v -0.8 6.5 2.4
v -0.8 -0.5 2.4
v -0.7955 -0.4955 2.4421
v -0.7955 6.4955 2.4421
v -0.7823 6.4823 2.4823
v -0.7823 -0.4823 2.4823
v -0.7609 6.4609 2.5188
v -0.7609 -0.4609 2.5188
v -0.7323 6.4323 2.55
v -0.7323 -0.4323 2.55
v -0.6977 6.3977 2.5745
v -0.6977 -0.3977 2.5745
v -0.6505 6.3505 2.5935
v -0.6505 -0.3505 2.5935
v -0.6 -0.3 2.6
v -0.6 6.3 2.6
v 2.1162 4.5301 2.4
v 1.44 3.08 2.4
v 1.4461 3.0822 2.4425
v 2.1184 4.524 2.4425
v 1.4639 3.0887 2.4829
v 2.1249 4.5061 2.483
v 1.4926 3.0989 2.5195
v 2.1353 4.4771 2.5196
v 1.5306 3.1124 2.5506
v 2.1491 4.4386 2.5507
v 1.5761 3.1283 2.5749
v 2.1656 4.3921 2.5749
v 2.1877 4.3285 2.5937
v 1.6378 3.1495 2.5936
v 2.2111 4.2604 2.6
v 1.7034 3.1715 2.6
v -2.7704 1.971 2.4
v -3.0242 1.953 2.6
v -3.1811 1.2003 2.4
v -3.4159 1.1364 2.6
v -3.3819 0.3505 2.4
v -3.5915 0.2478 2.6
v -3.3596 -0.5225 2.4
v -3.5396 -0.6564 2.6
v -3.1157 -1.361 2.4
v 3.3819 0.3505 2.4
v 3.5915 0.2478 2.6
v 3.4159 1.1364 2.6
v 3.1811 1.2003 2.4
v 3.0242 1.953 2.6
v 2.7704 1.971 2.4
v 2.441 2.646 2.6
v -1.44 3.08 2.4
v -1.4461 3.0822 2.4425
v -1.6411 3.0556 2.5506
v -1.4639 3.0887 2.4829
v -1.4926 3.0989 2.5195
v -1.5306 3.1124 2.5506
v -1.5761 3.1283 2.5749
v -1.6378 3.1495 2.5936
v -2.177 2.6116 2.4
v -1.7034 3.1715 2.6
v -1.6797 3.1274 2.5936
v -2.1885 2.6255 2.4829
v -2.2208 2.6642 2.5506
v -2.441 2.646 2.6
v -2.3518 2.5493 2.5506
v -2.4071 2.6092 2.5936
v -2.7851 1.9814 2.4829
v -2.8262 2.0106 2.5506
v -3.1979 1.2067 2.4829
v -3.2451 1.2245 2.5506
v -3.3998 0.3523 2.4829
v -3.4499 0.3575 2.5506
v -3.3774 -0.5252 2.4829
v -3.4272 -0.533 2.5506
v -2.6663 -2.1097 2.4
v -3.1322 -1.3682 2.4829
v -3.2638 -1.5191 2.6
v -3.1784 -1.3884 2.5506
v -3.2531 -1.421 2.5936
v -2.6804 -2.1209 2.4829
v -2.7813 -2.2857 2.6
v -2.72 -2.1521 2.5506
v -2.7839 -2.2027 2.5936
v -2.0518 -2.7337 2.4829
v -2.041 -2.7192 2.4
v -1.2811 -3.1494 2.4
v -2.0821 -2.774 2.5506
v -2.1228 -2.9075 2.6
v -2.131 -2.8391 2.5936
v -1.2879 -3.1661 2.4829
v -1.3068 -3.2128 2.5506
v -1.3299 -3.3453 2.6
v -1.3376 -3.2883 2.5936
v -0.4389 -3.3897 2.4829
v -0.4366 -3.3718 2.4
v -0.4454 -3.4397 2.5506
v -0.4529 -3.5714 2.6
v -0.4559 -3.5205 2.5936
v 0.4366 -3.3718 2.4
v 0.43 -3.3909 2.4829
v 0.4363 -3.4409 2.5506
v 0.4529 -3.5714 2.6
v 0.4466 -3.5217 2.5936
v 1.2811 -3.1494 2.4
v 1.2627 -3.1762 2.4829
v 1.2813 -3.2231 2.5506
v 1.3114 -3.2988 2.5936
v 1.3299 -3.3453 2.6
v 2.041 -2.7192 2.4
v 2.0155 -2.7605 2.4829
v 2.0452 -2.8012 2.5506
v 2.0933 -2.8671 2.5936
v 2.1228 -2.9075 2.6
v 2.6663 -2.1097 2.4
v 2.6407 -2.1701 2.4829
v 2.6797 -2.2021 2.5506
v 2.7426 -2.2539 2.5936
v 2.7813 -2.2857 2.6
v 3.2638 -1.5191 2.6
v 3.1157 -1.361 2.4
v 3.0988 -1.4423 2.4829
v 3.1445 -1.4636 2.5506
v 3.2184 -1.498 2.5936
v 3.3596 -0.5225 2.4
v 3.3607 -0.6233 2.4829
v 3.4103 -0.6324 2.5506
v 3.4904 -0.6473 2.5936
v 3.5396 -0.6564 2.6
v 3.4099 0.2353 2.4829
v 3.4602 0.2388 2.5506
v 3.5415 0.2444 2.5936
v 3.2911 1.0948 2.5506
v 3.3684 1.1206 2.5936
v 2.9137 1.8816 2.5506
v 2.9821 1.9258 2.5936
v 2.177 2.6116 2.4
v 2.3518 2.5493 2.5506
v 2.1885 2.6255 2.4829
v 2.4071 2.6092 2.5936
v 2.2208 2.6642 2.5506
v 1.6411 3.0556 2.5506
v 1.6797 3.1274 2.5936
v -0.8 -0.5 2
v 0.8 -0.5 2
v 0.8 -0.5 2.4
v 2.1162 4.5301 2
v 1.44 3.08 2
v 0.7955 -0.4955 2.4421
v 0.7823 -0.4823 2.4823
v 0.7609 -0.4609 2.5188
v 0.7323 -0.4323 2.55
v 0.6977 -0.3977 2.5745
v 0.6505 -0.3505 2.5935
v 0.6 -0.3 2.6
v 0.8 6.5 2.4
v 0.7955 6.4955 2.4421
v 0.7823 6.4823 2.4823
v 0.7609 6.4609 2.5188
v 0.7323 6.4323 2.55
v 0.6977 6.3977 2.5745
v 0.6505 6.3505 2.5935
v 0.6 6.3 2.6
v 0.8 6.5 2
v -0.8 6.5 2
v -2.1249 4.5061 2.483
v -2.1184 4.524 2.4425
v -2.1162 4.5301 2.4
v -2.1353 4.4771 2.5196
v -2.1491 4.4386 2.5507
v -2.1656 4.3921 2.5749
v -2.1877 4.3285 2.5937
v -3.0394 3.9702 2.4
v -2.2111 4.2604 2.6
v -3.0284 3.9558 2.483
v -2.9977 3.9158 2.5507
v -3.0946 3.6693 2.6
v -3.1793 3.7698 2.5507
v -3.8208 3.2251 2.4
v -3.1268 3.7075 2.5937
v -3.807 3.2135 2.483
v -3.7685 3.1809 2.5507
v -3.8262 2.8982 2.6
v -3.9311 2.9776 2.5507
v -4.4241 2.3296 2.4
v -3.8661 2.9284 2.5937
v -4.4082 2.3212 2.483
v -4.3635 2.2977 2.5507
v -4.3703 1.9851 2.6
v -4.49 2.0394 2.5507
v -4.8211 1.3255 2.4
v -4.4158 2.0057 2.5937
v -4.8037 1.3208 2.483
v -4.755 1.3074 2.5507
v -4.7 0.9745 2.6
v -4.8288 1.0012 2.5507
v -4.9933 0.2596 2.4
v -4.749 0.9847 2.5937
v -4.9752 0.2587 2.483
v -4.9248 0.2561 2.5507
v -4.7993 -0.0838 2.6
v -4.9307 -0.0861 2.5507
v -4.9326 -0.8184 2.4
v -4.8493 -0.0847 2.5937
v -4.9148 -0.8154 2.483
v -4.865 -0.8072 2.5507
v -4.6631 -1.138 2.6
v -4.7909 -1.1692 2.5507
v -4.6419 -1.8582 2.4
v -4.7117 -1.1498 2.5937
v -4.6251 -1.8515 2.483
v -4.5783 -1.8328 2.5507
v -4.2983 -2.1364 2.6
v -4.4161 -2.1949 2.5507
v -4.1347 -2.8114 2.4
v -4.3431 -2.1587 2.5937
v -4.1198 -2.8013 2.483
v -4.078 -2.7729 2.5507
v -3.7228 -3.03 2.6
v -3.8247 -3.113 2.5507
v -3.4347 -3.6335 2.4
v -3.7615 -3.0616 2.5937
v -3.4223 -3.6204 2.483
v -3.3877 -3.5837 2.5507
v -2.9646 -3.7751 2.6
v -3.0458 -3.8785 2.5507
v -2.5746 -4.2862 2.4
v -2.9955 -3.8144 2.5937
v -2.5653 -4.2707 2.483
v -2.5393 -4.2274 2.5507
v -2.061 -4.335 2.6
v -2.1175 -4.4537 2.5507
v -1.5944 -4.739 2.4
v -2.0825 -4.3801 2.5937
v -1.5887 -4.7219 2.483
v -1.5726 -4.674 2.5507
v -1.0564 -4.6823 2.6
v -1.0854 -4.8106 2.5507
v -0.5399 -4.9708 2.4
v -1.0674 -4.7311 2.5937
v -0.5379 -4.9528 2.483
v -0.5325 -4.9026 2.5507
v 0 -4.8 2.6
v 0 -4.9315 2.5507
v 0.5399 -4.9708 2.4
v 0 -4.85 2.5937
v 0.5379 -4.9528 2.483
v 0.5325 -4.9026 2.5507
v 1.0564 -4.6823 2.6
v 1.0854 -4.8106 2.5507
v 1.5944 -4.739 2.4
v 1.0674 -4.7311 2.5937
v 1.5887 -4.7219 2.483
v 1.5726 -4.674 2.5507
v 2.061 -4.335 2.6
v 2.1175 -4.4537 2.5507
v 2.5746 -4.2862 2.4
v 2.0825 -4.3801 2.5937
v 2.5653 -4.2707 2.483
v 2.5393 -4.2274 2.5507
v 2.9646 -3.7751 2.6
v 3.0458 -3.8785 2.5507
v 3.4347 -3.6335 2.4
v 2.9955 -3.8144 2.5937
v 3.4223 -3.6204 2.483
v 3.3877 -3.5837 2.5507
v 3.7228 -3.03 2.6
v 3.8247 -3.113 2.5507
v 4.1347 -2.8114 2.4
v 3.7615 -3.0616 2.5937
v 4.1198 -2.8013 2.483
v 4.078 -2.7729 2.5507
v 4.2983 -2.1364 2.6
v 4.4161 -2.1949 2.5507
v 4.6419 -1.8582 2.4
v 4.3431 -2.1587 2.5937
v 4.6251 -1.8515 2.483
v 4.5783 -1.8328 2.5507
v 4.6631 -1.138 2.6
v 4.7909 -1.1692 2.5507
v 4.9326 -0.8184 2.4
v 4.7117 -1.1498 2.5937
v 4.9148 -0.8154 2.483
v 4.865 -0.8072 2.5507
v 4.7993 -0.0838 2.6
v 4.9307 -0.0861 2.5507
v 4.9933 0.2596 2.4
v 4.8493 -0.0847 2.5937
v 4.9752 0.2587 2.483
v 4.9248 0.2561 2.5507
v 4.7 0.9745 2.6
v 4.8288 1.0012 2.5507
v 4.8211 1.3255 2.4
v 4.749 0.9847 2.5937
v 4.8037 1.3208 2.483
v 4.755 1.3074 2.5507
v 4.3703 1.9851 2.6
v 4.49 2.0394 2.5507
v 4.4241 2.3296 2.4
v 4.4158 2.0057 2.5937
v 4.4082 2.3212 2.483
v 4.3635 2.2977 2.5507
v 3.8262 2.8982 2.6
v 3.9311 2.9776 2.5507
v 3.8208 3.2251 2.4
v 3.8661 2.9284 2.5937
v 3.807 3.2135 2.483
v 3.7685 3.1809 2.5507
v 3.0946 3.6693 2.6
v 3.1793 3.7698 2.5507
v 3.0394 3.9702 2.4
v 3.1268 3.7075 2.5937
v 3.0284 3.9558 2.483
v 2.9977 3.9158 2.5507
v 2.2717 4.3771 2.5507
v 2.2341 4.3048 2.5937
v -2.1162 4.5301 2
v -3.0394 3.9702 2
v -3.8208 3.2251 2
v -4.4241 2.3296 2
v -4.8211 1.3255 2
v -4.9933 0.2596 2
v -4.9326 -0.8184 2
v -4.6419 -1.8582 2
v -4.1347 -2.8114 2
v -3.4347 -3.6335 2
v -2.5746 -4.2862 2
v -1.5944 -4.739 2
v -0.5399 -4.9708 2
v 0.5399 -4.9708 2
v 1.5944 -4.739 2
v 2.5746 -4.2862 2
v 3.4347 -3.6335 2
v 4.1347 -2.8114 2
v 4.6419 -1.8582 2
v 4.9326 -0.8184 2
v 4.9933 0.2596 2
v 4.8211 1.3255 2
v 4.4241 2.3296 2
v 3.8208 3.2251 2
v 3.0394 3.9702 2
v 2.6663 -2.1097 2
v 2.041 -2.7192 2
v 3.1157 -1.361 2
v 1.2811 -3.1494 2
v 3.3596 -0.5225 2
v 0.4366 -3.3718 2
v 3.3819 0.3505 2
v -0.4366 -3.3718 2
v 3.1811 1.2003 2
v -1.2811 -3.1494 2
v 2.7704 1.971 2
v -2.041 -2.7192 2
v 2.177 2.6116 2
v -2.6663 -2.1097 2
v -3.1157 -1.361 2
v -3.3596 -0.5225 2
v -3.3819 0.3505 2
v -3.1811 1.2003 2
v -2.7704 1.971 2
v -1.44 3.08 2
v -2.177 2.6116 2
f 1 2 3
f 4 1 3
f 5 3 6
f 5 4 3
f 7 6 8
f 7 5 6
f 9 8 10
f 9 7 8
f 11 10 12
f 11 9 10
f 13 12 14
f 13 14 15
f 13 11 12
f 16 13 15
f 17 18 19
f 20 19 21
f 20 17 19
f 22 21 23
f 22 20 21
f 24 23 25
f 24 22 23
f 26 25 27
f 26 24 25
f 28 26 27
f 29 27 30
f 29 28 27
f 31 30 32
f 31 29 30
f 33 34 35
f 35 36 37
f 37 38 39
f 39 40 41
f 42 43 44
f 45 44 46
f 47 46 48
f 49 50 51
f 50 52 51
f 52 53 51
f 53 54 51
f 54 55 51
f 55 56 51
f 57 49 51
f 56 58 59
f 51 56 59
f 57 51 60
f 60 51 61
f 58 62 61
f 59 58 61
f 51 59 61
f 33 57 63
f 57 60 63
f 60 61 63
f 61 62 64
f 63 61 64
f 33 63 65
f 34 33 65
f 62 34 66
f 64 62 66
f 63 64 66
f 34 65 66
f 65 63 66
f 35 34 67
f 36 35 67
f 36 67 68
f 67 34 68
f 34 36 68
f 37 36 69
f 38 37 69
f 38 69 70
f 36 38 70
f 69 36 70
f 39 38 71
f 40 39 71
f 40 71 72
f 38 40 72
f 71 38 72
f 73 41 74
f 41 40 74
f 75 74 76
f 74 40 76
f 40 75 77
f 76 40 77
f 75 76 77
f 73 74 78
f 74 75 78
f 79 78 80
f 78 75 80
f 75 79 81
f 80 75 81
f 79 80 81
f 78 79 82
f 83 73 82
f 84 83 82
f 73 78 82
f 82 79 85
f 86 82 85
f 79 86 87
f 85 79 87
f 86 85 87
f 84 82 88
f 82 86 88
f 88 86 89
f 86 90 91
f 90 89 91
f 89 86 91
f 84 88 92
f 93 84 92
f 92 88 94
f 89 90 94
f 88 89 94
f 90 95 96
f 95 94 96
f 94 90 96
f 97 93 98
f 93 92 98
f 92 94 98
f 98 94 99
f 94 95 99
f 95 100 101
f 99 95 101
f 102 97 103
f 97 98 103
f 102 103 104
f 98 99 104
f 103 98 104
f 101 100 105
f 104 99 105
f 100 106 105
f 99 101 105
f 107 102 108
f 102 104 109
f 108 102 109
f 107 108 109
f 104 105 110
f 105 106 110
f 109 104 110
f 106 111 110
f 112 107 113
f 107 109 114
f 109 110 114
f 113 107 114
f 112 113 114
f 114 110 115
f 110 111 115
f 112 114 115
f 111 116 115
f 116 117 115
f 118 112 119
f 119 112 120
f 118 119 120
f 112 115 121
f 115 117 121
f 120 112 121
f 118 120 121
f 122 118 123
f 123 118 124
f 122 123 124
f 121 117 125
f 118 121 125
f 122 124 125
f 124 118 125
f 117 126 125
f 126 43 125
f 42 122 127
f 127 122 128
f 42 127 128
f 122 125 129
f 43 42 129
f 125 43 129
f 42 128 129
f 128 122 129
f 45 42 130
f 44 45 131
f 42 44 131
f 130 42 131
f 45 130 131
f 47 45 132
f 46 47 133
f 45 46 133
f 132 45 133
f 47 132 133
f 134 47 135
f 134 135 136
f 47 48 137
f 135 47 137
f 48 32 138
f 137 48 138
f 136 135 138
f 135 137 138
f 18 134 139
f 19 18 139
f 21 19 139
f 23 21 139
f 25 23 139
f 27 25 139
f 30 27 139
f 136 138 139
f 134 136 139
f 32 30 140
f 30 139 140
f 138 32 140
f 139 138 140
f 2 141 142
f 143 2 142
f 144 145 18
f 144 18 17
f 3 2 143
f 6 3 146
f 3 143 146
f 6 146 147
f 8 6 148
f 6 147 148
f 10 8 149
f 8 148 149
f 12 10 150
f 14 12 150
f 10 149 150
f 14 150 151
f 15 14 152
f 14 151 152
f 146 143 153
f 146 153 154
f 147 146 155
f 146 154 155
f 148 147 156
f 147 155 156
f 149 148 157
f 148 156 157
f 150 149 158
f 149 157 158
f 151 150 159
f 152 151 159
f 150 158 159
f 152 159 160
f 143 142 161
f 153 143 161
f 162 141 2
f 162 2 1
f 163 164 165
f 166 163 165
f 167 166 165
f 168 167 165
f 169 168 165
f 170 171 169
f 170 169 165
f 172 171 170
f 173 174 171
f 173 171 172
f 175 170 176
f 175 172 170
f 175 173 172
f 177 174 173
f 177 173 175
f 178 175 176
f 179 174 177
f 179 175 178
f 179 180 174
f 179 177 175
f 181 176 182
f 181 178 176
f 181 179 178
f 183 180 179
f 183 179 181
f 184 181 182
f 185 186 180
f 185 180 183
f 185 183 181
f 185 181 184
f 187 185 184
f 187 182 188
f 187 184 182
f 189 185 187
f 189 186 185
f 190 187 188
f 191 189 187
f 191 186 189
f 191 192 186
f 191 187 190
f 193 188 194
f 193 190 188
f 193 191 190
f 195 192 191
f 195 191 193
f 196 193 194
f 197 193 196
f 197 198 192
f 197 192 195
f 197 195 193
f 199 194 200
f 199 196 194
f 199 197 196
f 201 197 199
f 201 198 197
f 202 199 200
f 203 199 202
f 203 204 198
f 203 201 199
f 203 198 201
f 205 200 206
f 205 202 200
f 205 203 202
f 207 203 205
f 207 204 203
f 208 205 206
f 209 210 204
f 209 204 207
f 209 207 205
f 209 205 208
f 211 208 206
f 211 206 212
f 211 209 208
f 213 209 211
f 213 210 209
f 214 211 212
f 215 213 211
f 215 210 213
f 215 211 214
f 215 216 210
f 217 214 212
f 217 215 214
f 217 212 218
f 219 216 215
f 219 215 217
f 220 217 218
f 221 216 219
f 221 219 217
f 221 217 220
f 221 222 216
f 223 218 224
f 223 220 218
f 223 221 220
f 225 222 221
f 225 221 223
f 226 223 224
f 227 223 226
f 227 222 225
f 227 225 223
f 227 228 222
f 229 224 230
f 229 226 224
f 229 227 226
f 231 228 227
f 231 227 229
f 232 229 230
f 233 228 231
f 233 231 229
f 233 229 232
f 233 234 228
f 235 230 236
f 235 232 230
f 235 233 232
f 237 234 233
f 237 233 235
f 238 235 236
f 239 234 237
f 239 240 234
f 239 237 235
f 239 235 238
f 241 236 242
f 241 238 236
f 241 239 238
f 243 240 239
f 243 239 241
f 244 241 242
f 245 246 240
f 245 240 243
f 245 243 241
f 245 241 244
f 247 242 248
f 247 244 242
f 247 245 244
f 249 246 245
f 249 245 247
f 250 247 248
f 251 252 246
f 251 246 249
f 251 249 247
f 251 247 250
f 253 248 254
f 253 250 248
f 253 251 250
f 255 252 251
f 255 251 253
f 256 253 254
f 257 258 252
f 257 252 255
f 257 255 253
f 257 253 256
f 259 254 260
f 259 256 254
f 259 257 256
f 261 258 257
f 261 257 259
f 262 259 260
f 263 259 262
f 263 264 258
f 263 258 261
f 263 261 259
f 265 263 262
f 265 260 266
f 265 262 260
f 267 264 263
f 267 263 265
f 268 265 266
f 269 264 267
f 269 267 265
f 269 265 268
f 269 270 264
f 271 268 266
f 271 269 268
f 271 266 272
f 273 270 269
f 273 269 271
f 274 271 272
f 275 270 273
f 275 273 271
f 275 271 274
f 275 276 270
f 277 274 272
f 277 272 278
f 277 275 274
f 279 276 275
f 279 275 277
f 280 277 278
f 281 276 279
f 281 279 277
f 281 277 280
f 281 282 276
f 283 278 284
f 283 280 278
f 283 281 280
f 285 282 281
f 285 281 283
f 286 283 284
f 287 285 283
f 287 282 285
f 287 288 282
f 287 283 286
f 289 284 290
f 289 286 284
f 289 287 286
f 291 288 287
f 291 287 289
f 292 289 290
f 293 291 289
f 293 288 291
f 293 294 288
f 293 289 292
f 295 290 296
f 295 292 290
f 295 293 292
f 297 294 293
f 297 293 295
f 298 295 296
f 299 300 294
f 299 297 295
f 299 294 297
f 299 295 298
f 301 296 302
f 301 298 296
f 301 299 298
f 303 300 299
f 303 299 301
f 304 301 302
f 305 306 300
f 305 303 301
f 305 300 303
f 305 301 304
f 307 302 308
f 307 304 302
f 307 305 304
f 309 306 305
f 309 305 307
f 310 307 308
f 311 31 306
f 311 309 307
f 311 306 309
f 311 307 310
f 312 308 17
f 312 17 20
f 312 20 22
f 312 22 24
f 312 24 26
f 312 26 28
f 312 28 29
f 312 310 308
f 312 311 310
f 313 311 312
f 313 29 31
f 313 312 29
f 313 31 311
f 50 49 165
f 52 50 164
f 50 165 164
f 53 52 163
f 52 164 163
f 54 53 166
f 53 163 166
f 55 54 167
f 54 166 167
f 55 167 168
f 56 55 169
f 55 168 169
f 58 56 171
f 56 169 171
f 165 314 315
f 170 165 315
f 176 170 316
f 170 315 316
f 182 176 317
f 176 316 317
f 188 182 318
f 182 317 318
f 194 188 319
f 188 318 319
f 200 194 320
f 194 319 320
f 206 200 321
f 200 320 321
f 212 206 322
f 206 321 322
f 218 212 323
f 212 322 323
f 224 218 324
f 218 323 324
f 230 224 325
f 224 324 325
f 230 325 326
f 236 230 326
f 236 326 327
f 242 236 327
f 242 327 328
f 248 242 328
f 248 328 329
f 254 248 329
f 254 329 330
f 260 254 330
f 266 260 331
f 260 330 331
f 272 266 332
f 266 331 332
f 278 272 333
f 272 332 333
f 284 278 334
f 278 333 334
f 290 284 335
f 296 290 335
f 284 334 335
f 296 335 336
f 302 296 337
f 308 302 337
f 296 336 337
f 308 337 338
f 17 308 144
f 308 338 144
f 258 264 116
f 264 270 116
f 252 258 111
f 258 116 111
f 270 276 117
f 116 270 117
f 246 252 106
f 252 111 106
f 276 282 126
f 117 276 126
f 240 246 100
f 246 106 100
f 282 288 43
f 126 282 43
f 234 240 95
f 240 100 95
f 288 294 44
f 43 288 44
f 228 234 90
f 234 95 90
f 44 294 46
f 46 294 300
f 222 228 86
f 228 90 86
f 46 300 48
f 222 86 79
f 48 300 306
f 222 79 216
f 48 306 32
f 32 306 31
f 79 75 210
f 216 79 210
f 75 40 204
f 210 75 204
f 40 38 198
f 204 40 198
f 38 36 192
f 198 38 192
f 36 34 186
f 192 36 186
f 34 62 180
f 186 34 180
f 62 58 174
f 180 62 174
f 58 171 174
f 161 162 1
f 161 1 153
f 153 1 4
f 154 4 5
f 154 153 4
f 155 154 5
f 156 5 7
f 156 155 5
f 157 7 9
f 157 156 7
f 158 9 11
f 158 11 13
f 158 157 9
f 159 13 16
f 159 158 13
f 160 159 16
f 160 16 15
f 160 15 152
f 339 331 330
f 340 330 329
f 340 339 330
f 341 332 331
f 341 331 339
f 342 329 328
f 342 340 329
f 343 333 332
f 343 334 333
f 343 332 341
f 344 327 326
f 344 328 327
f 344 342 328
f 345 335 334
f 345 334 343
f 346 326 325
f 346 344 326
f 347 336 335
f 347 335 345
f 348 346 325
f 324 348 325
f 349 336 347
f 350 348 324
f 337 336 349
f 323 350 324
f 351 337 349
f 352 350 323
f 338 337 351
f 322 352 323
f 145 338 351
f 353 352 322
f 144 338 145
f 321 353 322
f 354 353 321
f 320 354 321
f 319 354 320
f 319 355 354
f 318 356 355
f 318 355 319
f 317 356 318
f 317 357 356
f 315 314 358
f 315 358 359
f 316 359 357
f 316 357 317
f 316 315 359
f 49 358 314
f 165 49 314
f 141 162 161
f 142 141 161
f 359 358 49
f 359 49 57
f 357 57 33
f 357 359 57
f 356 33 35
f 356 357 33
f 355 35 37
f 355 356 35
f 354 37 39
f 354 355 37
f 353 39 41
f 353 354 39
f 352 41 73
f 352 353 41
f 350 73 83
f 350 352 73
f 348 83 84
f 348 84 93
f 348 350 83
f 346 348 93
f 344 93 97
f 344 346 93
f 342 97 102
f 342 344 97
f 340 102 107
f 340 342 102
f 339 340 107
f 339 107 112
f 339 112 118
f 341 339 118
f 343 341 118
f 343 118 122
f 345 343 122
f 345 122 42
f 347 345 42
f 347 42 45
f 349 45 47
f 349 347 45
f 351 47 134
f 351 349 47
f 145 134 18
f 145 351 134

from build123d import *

# Parameters (mm, degrees)
PAD012_DEPTH = 0.6
SKETCH021_W  = 1.6
SKETCH021_H  = 7
PAD013_DEPTH = 0.6
FILLET007_R  = 0.2


with BuildPart() as bild_power_ring:
    # Sketch019 → Pad012 (new body)
    with BuildSketch(Plane.XY):
        with BuildLine():
            Line((-0.56, 3.08), (0.116189, 4.530093))
            ThreePointArc((-4.116189, 4.530093), (-2, -5), (0.116189, 4.530093))
            Line((-3.44, 3.08), (-4.116189, 4.530093))
            ThreePointArc((-3.44, 3.08), (-2, -3.4), (-0.56, 3.08))
        make_face()
    extrude(amount=PAD012_DEPTH)


with BuildPart() as bild_power_ring_1:
    # Body014 placement: moved
    add(bild_power_ring.part.moved(Location((2, 0, 2))))


with BuildPart() as bild_power:
    # Sketch021 → Pad013 (new body)
    with BuildSketch(Plane.XY.offset(2)):
        with Locations((0, 3)):
            Rectangle(SKETCH021_W, SKETCH021_H)
    extrude(amount=PAD013_DEPTH)

    # Fusion005: union Bild Power Ring
    add(bild_power_ring_1.part)

    # Fillet007
    fillet007_edges = [bild_power.edges().sort_by_distance(p)[0] for p in [
        (0, 6.5, 2.6),
        (0.8, 3, 2.6),
        (0, -0.5, 2.6),
        (-0.8, 3, 2.6),
        (0, -3.4, 2.6),
        (1.778095, 3.805046, 2.6),
        (0, -5, 2.6),
        (-1.778095, 3.805046, 2.6),
    ]]
    fillet(fillet007_edges, radius=FILLET007_R)


solid = bild_power.part
